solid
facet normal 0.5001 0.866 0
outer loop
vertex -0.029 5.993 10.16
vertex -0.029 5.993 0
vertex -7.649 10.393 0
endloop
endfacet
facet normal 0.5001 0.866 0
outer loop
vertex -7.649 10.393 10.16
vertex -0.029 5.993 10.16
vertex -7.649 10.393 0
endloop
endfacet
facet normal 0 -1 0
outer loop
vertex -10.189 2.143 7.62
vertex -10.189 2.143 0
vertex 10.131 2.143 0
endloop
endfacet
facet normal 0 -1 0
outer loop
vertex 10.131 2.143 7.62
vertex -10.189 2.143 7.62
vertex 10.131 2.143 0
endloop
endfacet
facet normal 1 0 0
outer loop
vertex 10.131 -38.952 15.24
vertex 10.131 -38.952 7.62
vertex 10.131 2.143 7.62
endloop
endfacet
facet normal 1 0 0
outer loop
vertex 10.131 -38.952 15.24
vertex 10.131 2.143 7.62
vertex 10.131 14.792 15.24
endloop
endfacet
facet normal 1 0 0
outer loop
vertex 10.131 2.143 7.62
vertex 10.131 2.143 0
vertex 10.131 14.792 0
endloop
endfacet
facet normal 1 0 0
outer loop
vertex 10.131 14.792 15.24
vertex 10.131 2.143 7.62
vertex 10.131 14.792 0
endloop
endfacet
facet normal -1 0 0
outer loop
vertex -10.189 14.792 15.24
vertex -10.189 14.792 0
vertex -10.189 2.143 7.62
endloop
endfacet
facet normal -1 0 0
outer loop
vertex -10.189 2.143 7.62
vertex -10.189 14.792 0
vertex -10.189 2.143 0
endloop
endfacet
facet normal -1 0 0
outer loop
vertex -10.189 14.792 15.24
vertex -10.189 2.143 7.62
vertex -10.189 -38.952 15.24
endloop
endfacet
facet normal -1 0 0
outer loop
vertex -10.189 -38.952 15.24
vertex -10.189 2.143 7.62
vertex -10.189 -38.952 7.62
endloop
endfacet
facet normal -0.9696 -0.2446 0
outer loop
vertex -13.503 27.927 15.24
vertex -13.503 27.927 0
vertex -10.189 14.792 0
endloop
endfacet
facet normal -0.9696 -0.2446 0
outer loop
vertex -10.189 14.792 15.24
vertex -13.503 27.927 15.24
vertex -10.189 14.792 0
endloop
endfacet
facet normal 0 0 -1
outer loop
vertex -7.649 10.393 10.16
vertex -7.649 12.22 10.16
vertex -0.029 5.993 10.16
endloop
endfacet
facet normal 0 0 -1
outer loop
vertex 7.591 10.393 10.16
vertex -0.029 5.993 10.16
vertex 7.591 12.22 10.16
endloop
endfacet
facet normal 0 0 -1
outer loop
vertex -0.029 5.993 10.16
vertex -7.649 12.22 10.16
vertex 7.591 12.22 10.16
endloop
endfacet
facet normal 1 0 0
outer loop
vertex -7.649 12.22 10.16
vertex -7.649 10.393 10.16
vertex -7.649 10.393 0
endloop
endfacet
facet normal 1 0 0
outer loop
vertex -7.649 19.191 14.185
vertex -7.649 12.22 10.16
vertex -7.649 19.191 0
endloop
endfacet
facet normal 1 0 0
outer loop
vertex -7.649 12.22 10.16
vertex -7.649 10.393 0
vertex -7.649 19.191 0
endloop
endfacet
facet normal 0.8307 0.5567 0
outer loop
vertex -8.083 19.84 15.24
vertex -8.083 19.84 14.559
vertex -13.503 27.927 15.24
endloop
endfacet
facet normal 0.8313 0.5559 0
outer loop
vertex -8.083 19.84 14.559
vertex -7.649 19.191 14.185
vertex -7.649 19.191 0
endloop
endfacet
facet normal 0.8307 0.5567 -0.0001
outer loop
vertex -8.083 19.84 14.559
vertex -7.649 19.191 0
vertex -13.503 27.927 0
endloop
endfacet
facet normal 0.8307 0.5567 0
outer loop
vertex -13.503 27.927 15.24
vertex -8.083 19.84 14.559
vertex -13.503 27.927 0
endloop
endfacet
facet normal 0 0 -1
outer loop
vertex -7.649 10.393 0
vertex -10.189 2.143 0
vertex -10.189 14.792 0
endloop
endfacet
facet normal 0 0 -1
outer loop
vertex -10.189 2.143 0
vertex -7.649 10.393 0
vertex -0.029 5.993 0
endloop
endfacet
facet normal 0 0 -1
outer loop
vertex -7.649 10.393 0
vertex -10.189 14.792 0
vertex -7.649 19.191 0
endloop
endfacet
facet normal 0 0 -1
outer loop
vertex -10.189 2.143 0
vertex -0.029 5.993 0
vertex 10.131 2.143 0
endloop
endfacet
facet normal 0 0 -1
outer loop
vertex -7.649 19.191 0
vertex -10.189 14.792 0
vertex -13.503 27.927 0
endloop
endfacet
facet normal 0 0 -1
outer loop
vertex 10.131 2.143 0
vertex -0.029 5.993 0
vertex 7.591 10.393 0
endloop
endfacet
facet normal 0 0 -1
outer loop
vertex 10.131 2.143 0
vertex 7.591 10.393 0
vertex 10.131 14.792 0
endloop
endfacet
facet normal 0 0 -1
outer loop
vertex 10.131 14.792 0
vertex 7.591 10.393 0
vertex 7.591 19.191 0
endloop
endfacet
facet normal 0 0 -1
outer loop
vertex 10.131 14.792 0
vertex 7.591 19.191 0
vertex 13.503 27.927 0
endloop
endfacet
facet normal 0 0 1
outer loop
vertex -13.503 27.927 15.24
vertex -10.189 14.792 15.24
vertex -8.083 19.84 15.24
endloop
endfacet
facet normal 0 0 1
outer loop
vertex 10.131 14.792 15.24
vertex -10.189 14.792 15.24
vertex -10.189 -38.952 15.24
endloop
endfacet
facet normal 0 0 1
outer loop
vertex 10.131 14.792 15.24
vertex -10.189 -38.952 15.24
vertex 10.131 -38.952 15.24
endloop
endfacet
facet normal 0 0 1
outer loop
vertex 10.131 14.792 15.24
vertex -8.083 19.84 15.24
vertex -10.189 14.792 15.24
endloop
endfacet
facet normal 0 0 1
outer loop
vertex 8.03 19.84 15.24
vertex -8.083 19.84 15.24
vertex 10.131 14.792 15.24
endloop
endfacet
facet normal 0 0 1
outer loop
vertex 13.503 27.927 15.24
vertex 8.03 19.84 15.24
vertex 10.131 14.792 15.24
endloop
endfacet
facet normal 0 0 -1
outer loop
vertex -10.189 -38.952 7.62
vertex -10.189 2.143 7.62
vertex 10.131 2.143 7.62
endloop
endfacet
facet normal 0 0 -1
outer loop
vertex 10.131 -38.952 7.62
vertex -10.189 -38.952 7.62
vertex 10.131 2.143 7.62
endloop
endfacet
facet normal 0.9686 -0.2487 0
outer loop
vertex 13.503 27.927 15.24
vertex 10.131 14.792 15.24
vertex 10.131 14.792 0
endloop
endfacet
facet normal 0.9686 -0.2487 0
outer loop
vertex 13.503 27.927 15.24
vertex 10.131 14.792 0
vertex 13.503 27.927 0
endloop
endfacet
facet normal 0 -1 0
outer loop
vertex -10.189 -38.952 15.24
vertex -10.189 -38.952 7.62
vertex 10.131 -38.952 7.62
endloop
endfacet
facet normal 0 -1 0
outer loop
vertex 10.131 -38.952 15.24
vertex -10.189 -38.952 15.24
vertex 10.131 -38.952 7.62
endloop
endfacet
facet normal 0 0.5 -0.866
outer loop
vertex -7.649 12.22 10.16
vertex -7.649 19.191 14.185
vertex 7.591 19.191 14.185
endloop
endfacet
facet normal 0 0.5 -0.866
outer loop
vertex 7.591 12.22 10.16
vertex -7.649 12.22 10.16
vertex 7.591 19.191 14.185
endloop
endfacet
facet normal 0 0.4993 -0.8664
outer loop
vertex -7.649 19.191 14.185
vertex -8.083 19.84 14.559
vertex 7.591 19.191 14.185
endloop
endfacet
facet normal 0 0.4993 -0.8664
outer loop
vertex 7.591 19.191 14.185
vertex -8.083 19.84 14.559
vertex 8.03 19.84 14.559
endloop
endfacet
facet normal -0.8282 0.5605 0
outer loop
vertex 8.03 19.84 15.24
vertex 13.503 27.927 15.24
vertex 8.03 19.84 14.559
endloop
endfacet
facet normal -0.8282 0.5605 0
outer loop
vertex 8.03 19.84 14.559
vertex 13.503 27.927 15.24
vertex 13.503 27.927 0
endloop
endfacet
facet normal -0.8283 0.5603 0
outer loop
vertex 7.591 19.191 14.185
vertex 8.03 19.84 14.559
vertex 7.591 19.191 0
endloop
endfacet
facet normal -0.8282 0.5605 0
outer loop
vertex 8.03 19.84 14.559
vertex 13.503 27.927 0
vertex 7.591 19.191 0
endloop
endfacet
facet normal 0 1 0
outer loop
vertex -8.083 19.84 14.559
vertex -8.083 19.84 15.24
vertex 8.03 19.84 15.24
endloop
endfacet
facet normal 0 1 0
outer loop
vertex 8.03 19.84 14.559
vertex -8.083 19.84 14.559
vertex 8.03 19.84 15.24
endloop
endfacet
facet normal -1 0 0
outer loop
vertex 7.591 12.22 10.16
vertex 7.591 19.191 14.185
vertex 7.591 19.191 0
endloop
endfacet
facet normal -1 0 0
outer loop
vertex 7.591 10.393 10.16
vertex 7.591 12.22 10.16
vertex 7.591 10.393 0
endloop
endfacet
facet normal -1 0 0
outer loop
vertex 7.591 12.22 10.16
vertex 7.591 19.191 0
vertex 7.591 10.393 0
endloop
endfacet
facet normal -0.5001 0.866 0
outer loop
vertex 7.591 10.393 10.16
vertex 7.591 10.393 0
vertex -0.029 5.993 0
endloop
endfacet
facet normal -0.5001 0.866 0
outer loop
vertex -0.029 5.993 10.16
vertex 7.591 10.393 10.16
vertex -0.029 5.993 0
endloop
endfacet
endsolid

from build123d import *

# Parameters (mm, degrees)
F1_DEPTH = 15.24
F2_W     = 19.2376272753
F2_H     = 15.0951566175
F3_DEPTH = 5.08
F4_SIZE2 = 4.3994090512
F4_SIZE  = 7.62
F5_W     = 20.32
F5_H     = 41.094693502
F6_DEPTH = 7.62


with BuildPart() as f1:
    # F0 (on Top) → F1 (new body)
    with BuildSketch(Plane.XY):
        Polygon((-13.5031091049, 27.9268901795), (-10.1887094788, 14.7920455784), (-7.6487094788, 14.7920455784), (-7.6487094788, 19.1914546296), align=None)
        Polygon((-7.6487094788, 14.7920455784), (-10.1887094788, 14.7920455784), (-10.1887094788, -38.9519235189), (10.1312905212, -38.9519235189), (10.1312905212, 14.7920455784), (7.5912905212, 14.7920455784), (7.5912905212, 10.3926365271), (-0.0287094788, 5.9932274759), (-7.6487094788, 10.3926365271), align=None)
        Polygon((7.5912905212, 14.7920455784), (10.1312905212, 14.7920455784), (13.5031156242, 27.9268901795), (7.5912905212, 19.1914546296), align=None)
    extrude(amount=F1_DEPTH)

    # F2 (on face) → F3 (join)
    with BuildSketch(Plane.XY.offset(15.24)):
        with Locations((-0.1635341905, 12.2919357382)):
            Rectangle(F2_W, F2_H)
    extrude(amount=-F3_DEPTH)

    # F4
    f4_edges = [f1.edges().sort_by_distance(p)[0] for p in [
        (-0.026579, 19.839514, 10.16),
    ]]
    f4_side = f1.faces().sort_by_distance((-0.028648, 13.956011, 10.16))[0]
    chamfer(f4_edges, length=F4_SIZE, length2=F4_SIZE2, reference=f4_side)

    # F5 (on face) → F6 (cut)
    with BuildSketch(Plane(origin=(0, 0, 0), x_dir=(1, 0, 0), z_dir=(0, 0, -1))):
        with Locations((-0.0287094788, 18.4045767679)):
            Rectangle(F5_W, F5_H)
    extrude(amount=-F6_DEPTH, mode=Mode.SUBTRACT)


solid = f1.part
